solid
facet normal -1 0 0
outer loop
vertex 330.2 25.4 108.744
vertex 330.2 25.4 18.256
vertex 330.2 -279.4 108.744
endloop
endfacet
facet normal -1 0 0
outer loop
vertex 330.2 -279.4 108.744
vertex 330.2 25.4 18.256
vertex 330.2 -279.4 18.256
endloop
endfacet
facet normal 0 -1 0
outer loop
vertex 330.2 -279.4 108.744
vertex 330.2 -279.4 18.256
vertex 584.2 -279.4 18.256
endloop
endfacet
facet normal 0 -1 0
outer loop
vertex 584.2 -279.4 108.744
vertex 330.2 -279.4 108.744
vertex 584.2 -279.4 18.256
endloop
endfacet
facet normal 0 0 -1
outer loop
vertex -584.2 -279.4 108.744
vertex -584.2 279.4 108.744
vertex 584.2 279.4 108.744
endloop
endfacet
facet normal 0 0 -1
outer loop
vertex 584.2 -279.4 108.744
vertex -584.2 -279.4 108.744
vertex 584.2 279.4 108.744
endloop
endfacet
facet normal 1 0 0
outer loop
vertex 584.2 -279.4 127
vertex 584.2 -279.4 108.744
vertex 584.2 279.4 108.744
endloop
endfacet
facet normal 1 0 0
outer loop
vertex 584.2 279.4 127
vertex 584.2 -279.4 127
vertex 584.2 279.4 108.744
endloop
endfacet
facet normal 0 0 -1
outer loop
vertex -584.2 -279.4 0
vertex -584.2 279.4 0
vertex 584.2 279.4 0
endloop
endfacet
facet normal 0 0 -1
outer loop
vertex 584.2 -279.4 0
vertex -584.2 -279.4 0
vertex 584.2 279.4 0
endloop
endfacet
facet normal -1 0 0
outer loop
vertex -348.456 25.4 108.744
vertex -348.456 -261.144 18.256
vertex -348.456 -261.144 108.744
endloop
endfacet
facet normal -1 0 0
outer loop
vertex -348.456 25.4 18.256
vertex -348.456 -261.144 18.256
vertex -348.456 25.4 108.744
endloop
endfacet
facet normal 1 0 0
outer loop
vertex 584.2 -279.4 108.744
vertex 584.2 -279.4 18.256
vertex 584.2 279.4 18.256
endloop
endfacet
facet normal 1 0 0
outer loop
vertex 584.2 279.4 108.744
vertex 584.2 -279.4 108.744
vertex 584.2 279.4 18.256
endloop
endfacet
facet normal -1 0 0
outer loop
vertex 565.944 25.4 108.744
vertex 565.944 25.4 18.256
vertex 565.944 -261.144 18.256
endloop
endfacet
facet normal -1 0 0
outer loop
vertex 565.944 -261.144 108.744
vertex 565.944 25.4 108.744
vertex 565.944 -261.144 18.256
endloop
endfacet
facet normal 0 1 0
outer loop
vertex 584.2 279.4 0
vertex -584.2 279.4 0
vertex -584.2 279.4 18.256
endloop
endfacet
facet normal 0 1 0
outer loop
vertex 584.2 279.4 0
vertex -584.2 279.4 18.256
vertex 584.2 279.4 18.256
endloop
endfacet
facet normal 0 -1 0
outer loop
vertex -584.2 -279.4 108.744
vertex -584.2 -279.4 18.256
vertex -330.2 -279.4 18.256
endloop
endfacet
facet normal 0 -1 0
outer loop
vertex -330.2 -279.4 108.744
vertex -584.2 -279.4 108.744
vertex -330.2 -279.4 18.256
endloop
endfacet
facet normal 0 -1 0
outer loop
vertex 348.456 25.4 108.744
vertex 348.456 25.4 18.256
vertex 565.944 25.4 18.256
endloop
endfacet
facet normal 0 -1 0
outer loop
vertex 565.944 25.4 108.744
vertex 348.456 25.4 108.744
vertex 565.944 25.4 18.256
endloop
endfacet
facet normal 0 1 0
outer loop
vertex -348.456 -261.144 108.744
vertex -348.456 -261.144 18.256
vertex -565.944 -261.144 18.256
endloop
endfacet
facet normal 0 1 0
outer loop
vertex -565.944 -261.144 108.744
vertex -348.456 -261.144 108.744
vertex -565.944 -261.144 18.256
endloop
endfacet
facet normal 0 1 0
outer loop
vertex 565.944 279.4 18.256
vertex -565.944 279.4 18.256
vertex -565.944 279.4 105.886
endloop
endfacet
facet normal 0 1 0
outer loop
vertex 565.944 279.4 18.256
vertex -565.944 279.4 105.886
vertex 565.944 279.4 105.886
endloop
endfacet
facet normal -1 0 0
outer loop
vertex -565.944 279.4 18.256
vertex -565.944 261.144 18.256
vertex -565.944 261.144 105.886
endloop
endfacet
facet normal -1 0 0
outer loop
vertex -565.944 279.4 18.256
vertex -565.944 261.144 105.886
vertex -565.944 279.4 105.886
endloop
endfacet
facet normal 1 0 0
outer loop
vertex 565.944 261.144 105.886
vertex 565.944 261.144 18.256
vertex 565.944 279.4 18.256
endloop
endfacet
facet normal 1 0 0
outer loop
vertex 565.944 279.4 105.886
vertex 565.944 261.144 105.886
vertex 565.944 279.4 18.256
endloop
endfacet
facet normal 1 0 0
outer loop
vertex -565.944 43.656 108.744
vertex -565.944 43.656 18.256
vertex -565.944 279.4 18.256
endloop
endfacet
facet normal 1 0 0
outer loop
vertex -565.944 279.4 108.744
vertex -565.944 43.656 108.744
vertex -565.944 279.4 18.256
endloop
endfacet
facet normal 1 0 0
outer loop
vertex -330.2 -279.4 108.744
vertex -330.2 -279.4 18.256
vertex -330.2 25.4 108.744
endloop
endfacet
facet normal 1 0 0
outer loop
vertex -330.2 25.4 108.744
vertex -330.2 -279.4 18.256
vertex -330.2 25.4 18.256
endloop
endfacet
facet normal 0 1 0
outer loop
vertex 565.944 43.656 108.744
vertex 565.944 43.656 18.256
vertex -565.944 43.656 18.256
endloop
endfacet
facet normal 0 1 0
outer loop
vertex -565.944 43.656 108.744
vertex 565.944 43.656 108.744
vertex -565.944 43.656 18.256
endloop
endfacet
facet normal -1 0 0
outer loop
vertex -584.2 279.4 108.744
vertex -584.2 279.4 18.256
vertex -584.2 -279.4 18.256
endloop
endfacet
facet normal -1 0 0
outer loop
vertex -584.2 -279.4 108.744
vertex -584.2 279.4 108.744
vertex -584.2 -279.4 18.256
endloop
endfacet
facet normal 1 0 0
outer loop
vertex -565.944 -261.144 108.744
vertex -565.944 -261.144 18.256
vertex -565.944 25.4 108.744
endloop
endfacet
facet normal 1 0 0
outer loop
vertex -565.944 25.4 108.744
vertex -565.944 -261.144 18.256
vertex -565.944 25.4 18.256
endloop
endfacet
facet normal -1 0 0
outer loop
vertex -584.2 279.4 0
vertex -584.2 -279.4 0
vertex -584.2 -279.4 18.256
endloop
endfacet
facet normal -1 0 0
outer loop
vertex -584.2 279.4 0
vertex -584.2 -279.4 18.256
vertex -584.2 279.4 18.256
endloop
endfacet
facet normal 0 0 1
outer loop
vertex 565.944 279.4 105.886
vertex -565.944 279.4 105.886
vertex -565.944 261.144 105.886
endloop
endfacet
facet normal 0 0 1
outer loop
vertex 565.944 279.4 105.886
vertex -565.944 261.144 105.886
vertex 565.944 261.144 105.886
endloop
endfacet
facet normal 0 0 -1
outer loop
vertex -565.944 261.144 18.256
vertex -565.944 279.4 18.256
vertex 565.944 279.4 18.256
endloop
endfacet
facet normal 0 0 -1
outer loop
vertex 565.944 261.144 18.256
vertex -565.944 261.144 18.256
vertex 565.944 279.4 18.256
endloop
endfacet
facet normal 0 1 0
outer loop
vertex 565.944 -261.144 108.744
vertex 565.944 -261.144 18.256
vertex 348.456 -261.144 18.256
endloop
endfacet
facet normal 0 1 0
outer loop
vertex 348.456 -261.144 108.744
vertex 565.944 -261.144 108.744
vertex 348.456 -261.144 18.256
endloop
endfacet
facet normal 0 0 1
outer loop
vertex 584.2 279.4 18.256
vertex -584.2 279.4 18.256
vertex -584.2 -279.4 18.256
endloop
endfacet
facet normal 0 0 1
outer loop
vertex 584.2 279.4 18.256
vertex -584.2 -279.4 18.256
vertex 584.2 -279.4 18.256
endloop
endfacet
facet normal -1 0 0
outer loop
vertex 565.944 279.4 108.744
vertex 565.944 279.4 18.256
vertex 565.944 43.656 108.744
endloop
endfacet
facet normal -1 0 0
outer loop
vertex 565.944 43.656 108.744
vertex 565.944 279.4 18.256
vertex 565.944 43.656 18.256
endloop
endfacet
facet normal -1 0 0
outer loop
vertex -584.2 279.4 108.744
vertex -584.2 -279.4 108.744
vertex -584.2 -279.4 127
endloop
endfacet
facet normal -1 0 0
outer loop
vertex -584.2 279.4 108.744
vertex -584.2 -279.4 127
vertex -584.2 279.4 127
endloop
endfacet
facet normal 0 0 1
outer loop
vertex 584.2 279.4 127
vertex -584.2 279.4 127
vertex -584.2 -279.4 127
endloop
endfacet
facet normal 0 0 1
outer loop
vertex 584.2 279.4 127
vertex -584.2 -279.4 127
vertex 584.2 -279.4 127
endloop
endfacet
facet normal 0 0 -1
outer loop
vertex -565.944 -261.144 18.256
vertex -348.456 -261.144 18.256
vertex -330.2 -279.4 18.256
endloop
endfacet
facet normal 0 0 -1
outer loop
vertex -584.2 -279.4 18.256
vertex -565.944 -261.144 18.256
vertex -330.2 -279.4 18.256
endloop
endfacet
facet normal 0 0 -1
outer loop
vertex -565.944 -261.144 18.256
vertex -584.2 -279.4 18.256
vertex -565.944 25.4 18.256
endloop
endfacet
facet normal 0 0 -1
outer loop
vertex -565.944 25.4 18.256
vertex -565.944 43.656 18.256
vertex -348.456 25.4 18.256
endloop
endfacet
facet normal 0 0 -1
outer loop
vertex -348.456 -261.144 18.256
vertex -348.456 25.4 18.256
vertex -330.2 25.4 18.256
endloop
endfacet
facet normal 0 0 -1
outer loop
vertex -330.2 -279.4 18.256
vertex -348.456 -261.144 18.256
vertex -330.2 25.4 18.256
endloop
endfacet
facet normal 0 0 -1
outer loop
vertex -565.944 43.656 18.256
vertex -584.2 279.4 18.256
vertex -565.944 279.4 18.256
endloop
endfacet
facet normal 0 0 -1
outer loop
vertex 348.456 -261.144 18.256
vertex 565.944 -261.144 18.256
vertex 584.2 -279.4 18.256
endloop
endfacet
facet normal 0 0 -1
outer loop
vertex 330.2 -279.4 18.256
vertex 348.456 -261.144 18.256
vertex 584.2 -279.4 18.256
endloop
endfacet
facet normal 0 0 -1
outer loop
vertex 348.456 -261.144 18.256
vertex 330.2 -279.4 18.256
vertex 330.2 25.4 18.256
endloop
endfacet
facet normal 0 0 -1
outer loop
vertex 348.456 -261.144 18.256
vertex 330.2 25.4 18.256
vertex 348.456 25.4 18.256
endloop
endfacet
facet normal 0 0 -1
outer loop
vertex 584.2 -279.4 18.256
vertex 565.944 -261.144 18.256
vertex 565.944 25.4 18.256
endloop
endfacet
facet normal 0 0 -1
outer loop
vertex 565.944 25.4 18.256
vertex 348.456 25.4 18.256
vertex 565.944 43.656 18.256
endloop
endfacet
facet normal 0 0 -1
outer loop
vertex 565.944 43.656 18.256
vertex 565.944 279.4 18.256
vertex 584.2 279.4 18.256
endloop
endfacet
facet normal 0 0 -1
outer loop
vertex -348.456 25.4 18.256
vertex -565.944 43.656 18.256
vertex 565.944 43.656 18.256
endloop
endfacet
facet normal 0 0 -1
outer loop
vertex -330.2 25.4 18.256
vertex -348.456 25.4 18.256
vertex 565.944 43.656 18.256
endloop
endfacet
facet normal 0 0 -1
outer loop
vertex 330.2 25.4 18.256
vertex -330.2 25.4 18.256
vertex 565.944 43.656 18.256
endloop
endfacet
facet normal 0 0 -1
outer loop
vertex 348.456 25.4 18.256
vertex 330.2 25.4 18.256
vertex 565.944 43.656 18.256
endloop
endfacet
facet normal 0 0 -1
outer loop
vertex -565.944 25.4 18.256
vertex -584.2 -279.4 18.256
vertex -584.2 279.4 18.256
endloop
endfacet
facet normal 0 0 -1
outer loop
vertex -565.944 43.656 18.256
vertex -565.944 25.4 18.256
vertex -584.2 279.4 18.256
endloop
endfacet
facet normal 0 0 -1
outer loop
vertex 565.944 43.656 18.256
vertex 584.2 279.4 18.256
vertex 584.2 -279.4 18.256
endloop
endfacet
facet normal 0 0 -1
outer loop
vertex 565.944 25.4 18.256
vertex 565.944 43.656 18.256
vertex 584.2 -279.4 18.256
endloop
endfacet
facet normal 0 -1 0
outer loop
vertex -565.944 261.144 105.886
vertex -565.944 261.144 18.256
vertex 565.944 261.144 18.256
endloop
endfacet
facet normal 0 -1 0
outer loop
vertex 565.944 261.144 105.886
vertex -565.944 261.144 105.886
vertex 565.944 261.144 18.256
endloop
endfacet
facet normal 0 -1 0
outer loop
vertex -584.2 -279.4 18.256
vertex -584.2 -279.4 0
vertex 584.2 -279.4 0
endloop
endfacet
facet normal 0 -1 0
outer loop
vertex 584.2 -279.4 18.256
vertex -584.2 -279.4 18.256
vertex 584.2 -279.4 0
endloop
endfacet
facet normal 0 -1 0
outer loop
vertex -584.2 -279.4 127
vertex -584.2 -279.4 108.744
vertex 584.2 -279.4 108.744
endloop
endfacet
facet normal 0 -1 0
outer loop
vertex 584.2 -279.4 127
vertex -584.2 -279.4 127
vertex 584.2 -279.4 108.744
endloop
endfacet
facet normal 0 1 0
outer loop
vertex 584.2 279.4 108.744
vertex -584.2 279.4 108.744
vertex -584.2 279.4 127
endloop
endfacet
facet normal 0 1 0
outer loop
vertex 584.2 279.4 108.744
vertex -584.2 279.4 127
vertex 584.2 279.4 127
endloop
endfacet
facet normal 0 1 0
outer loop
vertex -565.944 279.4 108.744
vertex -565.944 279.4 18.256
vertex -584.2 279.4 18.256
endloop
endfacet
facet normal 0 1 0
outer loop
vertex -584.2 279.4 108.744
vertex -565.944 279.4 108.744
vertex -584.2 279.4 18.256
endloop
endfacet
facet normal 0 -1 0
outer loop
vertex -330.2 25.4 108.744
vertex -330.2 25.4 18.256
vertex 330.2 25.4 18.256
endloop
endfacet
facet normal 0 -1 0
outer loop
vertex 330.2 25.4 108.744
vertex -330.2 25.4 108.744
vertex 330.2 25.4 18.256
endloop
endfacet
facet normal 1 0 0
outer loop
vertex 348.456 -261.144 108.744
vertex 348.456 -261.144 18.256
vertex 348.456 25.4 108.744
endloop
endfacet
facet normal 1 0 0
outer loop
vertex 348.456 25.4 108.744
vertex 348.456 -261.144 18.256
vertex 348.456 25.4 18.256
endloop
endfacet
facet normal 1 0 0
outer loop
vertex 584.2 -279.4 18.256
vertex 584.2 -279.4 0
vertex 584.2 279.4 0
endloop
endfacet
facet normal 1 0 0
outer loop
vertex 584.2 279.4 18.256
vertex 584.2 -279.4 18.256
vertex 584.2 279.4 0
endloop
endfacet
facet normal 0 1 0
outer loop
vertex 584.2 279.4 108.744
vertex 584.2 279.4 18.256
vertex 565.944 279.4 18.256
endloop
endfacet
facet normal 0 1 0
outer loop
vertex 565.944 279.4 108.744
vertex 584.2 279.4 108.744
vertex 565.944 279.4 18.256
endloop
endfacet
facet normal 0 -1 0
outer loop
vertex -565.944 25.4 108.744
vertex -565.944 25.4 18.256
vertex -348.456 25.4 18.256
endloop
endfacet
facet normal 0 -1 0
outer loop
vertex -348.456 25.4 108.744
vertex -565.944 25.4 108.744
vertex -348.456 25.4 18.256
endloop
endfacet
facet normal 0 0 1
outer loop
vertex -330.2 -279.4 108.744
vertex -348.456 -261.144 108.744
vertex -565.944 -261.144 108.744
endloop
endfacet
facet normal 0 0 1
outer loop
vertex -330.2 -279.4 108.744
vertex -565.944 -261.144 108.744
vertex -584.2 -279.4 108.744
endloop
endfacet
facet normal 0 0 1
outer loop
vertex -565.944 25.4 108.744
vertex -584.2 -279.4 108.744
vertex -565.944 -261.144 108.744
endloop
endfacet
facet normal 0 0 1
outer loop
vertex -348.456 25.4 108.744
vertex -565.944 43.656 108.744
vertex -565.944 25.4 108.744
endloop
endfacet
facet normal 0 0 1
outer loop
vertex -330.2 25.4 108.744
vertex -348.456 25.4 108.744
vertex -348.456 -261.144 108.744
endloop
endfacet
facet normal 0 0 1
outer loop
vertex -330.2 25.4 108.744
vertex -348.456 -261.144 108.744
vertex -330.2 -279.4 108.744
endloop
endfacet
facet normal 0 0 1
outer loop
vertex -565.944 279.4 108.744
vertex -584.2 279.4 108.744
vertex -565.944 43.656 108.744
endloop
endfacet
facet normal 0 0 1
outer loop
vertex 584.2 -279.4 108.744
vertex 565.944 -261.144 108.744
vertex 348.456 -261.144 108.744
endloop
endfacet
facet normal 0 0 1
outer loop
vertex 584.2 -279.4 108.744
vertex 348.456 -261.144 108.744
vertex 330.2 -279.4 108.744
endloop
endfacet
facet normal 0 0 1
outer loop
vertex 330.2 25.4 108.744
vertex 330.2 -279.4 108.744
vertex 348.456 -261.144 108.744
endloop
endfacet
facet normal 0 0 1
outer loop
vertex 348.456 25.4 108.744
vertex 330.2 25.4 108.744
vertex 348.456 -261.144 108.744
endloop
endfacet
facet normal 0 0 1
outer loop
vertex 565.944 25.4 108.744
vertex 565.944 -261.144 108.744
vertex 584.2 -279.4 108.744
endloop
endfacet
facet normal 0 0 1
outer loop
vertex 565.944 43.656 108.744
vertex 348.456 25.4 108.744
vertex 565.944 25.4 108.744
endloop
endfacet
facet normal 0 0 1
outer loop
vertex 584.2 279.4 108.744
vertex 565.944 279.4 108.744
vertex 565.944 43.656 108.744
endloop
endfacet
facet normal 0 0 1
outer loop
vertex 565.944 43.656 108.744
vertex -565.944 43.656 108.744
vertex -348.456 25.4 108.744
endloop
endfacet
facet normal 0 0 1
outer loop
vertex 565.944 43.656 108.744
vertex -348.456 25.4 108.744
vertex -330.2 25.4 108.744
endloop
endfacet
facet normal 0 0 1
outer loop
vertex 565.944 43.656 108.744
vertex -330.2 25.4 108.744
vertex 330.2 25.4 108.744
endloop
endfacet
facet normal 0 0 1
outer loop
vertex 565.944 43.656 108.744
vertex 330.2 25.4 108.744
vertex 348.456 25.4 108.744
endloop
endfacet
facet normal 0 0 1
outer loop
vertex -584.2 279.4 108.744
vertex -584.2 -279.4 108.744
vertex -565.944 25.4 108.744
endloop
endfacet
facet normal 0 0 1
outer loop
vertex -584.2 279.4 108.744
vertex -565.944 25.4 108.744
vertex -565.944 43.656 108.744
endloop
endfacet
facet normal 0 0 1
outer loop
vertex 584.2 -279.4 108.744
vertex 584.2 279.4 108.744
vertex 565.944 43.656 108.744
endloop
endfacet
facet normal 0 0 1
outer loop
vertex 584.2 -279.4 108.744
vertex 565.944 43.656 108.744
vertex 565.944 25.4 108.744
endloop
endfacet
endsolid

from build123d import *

# Parameters (mm, degrees)
F0_W     = 1168.4
F0_H     = 558.8
F1_DEPTH = 18.25625
F2_W     = 18.25625
F2_H     = 286.54375
F3_DEPTH = 90.4875
F4_W     = 1131.8875
F4_H     = 18.25625
F5_DEPTH = 87.63
F6_W     = 1168.4
F6_H     = 558.8
F7_DEPTH = 18.25625


with BuildPart() as f1:
    # F0 (on Top) → F1 (new body)
    with BuildSketch(Plane.XY):
        Rectangle(F0_W, F0_H)
    extrude(amount=F1_DEPTH)


with BuildPart() as f3:
    # F2 (on face) → F3 (new body)
    with BuildSketch(Plane.XY.offset(18.25625)):
        Polygon((565.94375, 43.65625), (-565.94375, 43.65625), (-565.94375, 25.4), (-348.45625, 25.4), (-330.2, 25.4), (330.2, 25.4), (348.45625, 25.4), (565.94375, 25.4), align=None)
        Polygon((-565.94375, 25.4), (-565.94375, 43.65625), (-565.94375, 279.4), (-584.2, 279.4), (-584.2, -261.14375), (-565.94375, -261.14375), align=None)
        Polygon((565.94375, 279.4), (565.94375, 43.65625), (565.94375, 25.4), (565.94375, -261.14375), (584.2, -261.14375), (584.2, 279.4), align=None)
        with Locations((-339.328125, -117.871875)):
            Rectangle(F2_W, F2_H)
        Polygon((-348.45625, -261.14375), (-565.94375, -261.14375), (-584.2, -261.14375), (-584.2, -279.4), (-330.2, -279.4), (-330.2, -261.14375), align=None)
        with Locations((339.328125, -117.871875)):
            Rectangle(F2_W, F2_H)
        Polygon((584.2, -261.14375), (565.94375, -261.14375), (348.45625, -261.14375), (330.2, -261.14375), (330.2, -279.4), (584.2, -279.4), align=None)
    extrude(amount=F3_DEPTH)


with BuildPart() as f5:
    # F4 (on face) → F5 (new body)
    with BuildSketch(Plane.XY.offset(18.25625)):
        with Locations((0, 270.271875)):
            Rectangle(F4_W, F4_H)
    extrude(amount=F5_DEPTH)


with BuildPart() as f7:
    # F6 (on face) → F7 (new body)
    with BuildSketch(Plane.XY.offset(108.74375)):
        Rectangle(F6_W, F6_H)
    extrude(amount=F7_DEPTH)


solid = Compound([f1.part, f3.part, f5.part, f7.part])
